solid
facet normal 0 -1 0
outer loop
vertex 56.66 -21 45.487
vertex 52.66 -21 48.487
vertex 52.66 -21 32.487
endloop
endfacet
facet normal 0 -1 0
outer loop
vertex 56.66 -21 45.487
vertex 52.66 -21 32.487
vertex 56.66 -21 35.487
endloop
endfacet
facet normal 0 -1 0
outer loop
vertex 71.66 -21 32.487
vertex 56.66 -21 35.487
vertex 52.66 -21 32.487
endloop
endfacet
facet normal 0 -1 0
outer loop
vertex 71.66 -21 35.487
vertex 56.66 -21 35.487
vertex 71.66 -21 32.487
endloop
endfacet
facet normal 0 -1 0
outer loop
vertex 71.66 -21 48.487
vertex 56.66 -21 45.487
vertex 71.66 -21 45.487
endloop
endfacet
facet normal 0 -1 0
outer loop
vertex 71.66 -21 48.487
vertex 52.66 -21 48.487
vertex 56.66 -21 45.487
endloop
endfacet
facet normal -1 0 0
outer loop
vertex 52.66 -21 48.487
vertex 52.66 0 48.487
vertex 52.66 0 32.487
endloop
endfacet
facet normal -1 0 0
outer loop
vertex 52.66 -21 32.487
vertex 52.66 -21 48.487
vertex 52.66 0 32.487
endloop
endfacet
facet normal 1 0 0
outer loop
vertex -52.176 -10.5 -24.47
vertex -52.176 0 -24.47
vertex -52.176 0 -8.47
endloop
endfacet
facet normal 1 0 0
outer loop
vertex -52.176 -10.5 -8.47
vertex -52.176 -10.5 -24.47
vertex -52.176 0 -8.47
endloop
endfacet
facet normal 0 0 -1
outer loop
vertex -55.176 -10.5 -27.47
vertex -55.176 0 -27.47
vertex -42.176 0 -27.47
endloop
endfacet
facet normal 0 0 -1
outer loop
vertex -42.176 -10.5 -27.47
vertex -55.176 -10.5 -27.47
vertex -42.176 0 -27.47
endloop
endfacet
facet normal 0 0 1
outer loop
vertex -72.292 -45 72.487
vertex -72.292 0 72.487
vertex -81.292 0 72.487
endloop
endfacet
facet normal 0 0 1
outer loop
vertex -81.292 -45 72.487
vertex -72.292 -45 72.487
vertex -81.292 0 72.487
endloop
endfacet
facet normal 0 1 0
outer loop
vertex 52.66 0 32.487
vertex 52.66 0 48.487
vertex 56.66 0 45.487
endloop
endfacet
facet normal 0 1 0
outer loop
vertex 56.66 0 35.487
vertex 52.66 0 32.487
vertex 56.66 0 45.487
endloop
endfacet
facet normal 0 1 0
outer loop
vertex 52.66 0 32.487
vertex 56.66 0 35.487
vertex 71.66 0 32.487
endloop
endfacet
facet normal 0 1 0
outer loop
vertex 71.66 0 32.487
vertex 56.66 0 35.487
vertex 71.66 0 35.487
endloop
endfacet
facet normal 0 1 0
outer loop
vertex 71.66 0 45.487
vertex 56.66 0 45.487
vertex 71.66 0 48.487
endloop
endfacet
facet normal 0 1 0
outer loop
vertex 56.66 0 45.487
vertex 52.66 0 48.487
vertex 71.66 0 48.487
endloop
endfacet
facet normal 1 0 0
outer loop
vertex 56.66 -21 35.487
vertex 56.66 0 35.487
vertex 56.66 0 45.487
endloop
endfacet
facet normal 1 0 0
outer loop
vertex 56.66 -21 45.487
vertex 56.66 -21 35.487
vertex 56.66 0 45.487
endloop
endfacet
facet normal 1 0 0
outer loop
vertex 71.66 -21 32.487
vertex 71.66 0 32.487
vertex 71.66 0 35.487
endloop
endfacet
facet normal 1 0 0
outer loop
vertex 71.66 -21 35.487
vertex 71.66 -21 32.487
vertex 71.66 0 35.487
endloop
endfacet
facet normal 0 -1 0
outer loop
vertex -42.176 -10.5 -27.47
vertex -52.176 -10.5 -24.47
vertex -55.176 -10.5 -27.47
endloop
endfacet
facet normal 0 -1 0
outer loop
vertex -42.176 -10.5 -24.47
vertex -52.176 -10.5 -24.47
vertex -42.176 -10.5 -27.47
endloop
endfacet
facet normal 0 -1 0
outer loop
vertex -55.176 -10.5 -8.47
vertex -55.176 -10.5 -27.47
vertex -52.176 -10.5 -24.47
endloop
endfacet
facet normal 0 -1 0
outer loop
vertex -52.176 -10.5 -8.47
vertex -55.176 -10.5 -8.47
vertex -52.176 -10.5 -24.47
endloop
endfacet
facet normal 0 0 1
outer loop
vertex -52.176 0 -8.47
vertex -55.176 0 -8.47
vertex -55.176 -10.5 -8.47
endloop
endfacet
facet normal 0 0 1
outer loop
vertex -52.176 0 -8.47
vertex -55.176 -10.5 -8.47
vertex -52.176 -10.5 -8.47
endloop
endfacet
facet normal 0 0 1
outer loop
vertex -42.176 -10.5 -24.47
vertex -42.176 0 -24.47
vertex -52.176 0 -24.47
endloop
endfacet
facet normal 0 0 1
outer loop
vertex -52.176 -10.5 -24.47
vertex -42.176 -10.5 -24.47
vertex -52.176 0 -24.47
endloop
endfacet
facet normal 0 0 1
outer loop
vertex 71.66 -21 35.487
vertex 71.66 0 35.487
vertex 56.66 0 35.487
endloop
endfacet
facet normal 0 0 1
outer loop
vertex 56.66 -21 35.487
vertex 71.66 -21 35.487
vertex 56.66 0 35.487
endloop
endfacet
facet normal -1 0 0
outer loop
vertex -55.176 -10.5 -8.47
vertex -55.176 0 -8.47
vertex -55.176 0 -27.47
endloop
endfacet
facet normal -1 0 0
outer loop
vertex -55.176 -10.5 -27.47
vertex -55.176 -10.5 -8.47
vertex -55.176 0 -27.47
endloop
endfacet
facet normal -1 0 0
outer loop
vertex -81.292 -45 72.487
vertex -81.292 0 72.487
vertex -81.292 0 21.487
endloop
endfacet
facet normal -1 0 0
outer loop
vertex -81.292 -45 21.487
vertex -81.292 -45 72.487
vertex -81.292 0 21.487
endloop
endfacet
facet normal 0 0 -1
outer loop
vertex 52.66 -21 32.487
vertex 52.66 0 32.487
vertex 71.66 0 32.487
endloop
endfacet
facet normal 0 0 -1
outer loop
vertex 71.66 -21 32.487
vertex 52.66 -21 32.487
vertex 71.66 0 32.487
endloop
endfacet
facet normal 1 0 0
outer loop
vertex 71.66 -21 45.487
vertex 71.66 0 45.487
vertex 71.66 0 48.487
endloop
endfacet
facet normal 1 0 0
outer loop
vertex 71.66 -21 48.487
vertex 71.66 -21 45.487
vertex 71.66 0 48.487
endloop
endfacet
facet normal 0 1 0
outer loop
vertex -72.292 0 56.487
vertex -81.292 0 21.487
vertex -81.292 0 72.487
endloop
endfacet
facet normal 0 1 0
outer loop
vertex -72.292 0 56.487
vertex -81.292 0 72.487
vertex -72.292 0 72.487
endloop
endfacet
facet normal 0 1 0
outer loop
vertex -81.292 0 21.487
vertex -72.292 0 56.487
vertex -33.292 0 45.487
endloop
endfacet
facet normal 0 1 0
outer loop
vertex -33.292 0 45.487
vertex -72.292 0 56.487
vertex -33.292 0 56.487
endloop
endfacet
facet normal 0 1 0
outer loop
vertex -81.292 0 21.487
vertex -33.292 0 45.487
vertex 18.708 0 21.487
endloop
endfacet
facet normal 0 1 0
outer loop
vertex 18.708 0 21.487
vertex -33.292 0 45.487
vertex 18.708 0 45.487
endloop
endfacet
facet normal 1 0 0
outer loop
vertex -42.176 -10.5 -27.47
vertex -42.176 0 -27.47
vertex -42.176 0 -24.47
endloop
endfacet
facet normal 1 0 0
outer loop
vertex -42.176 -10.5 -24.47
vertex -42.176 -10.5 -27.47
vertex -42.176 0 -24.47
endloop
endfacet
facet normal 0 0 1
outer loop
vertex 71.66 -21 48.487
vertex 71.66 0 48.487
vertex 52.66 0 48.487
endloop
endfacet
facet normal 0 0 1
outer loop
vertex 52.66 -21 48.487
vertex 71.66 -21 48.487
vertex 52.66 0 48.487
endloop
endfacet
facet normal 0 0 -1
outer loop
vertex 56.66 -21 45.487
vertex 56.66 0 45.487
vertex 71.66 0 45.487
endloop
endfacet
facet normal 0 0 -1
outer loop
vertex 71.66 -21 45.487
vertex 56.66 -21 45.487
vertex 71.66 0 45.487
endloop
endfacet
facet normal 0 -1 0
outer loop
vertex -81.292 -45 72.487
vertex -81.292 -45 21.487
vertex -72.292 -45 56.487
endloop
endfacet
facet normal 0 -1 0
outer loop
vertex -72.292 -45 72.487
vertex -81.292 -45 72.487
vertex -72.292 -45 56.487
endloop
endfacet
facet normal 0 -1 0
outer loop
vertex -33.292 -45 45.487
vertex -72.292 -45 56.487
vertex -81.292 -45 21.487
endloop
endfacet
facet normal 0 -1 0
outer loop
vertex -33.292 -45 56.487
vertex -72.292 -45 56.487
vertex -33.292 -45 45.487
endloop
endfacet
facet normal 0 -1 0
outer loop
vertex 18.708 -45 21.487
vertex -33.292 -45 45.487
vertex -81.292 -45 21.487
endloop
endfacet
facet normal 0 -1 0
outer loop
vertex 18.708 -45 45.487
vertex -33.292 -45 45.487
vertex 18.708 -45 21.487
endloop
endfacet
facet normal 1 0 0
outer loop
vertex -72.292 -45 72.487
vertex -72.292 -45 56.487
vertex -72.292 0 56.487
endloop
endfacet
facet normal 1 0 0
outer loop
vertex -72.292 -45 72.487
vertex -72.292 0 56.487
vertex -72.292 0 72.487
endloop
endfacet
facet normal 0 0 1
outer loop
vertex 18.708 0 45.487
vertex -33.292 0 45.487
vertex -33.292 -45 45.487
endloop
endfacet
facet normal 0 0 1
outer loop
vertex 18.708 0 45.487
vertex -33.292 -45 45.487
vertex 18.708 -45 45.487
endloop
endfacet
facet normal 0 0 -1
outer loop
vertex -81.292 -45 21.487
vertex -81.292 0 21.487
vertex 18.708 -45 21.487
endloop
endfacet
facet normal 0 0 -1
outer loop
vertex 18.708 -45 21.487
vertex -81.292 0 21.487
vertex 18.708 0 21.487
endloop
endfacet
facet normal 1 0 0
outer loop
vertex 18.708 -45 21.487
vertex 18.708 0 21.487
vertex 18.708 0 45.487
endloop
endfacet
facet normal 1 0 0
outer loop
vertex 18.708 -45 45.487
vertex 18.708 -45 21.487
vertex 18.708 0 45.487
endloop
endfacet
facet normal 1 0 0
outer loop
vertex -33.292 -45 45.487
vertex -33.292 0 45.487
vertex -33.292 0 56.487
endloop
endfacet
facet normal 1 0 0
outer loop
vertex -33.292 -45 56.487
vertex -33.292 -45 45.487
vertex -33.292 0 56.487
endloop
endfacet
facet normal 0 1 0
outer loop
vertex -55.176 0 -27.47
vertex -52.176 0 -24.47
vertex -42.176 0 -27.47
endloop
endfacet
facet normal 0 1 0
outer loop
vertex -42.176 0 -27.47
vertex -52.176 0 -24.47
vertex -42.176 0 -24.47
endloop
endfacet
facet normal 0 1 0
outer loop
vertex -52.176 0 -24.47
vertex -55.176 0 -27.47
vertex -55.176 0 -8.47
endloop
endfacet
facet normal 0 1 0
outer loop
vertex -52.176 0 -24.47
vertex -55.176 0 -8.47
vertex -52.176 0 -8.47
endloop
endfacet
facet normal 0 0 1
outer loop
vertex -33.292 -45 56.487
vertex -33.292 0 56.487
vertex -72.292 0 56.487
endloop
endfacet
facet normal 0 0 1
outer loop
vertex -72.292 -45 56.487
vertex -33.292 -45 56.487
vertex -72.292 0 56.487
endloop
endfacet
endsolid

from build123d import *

# Parameters (mm, degrees)
F0_W     = 52
F0_H     = 24
F1_DEPTH = 45
F3_DEPTH = 21
F4_W     = 3
F4_H     = 16
F5_DEPTH = 10.5


with BuildPart() as f1:
    # F0 (on Front) → F1 (new body)
    with BuildSketch(Plane.XZ):
        Polygon((-72.292375, 72.486585), (-81.292375, 72.486585), (-81.292375, 21.486585), (-33.292375, 21.486585), (-33.292375, 45.486585), (-33.292375, 56.486585), (-72.292375, 56.486585), align=None)
        with Locations((-7.292375, 33.486585)):
            Rectangle(F0_W, F0_H)
    extrude(amount=F1_DEPTH)


with BuildPart() as f3:
    # F2 (on Front) → F3 (new body)
    with BuildSketch(Plane.XZ):
        Polygon((71.659603, 48.487288), (52.659603, 48.487288), (52.659603, 32.487288), (71.659603, 32.487288), (71.659603, 35.487288), (56.659603, 35.487288), (56.659603, 45.487288), (71.659603, 45.487288), align=None)
    extrude(amount=F3_DEPTH)


with BuildPart() as f5:
    # F4 (on Front) → F5 (new body)
    with BuildSketch(Plane.XZ):
        Polygon((-52.175846, -24.469521), (-55.175846, -24.469521), (-55.175846, -27.469521), (-42.175846, -27.469521), (-42.175846, -24.469521), align=None)
        with Locations((-53.675846, -16.469521)):
            Rectangle(F4_W, F4_H)
    extrude(amount=F5_DEPTH)


solid = Compound([f1.part, f3.part, f5.part])
